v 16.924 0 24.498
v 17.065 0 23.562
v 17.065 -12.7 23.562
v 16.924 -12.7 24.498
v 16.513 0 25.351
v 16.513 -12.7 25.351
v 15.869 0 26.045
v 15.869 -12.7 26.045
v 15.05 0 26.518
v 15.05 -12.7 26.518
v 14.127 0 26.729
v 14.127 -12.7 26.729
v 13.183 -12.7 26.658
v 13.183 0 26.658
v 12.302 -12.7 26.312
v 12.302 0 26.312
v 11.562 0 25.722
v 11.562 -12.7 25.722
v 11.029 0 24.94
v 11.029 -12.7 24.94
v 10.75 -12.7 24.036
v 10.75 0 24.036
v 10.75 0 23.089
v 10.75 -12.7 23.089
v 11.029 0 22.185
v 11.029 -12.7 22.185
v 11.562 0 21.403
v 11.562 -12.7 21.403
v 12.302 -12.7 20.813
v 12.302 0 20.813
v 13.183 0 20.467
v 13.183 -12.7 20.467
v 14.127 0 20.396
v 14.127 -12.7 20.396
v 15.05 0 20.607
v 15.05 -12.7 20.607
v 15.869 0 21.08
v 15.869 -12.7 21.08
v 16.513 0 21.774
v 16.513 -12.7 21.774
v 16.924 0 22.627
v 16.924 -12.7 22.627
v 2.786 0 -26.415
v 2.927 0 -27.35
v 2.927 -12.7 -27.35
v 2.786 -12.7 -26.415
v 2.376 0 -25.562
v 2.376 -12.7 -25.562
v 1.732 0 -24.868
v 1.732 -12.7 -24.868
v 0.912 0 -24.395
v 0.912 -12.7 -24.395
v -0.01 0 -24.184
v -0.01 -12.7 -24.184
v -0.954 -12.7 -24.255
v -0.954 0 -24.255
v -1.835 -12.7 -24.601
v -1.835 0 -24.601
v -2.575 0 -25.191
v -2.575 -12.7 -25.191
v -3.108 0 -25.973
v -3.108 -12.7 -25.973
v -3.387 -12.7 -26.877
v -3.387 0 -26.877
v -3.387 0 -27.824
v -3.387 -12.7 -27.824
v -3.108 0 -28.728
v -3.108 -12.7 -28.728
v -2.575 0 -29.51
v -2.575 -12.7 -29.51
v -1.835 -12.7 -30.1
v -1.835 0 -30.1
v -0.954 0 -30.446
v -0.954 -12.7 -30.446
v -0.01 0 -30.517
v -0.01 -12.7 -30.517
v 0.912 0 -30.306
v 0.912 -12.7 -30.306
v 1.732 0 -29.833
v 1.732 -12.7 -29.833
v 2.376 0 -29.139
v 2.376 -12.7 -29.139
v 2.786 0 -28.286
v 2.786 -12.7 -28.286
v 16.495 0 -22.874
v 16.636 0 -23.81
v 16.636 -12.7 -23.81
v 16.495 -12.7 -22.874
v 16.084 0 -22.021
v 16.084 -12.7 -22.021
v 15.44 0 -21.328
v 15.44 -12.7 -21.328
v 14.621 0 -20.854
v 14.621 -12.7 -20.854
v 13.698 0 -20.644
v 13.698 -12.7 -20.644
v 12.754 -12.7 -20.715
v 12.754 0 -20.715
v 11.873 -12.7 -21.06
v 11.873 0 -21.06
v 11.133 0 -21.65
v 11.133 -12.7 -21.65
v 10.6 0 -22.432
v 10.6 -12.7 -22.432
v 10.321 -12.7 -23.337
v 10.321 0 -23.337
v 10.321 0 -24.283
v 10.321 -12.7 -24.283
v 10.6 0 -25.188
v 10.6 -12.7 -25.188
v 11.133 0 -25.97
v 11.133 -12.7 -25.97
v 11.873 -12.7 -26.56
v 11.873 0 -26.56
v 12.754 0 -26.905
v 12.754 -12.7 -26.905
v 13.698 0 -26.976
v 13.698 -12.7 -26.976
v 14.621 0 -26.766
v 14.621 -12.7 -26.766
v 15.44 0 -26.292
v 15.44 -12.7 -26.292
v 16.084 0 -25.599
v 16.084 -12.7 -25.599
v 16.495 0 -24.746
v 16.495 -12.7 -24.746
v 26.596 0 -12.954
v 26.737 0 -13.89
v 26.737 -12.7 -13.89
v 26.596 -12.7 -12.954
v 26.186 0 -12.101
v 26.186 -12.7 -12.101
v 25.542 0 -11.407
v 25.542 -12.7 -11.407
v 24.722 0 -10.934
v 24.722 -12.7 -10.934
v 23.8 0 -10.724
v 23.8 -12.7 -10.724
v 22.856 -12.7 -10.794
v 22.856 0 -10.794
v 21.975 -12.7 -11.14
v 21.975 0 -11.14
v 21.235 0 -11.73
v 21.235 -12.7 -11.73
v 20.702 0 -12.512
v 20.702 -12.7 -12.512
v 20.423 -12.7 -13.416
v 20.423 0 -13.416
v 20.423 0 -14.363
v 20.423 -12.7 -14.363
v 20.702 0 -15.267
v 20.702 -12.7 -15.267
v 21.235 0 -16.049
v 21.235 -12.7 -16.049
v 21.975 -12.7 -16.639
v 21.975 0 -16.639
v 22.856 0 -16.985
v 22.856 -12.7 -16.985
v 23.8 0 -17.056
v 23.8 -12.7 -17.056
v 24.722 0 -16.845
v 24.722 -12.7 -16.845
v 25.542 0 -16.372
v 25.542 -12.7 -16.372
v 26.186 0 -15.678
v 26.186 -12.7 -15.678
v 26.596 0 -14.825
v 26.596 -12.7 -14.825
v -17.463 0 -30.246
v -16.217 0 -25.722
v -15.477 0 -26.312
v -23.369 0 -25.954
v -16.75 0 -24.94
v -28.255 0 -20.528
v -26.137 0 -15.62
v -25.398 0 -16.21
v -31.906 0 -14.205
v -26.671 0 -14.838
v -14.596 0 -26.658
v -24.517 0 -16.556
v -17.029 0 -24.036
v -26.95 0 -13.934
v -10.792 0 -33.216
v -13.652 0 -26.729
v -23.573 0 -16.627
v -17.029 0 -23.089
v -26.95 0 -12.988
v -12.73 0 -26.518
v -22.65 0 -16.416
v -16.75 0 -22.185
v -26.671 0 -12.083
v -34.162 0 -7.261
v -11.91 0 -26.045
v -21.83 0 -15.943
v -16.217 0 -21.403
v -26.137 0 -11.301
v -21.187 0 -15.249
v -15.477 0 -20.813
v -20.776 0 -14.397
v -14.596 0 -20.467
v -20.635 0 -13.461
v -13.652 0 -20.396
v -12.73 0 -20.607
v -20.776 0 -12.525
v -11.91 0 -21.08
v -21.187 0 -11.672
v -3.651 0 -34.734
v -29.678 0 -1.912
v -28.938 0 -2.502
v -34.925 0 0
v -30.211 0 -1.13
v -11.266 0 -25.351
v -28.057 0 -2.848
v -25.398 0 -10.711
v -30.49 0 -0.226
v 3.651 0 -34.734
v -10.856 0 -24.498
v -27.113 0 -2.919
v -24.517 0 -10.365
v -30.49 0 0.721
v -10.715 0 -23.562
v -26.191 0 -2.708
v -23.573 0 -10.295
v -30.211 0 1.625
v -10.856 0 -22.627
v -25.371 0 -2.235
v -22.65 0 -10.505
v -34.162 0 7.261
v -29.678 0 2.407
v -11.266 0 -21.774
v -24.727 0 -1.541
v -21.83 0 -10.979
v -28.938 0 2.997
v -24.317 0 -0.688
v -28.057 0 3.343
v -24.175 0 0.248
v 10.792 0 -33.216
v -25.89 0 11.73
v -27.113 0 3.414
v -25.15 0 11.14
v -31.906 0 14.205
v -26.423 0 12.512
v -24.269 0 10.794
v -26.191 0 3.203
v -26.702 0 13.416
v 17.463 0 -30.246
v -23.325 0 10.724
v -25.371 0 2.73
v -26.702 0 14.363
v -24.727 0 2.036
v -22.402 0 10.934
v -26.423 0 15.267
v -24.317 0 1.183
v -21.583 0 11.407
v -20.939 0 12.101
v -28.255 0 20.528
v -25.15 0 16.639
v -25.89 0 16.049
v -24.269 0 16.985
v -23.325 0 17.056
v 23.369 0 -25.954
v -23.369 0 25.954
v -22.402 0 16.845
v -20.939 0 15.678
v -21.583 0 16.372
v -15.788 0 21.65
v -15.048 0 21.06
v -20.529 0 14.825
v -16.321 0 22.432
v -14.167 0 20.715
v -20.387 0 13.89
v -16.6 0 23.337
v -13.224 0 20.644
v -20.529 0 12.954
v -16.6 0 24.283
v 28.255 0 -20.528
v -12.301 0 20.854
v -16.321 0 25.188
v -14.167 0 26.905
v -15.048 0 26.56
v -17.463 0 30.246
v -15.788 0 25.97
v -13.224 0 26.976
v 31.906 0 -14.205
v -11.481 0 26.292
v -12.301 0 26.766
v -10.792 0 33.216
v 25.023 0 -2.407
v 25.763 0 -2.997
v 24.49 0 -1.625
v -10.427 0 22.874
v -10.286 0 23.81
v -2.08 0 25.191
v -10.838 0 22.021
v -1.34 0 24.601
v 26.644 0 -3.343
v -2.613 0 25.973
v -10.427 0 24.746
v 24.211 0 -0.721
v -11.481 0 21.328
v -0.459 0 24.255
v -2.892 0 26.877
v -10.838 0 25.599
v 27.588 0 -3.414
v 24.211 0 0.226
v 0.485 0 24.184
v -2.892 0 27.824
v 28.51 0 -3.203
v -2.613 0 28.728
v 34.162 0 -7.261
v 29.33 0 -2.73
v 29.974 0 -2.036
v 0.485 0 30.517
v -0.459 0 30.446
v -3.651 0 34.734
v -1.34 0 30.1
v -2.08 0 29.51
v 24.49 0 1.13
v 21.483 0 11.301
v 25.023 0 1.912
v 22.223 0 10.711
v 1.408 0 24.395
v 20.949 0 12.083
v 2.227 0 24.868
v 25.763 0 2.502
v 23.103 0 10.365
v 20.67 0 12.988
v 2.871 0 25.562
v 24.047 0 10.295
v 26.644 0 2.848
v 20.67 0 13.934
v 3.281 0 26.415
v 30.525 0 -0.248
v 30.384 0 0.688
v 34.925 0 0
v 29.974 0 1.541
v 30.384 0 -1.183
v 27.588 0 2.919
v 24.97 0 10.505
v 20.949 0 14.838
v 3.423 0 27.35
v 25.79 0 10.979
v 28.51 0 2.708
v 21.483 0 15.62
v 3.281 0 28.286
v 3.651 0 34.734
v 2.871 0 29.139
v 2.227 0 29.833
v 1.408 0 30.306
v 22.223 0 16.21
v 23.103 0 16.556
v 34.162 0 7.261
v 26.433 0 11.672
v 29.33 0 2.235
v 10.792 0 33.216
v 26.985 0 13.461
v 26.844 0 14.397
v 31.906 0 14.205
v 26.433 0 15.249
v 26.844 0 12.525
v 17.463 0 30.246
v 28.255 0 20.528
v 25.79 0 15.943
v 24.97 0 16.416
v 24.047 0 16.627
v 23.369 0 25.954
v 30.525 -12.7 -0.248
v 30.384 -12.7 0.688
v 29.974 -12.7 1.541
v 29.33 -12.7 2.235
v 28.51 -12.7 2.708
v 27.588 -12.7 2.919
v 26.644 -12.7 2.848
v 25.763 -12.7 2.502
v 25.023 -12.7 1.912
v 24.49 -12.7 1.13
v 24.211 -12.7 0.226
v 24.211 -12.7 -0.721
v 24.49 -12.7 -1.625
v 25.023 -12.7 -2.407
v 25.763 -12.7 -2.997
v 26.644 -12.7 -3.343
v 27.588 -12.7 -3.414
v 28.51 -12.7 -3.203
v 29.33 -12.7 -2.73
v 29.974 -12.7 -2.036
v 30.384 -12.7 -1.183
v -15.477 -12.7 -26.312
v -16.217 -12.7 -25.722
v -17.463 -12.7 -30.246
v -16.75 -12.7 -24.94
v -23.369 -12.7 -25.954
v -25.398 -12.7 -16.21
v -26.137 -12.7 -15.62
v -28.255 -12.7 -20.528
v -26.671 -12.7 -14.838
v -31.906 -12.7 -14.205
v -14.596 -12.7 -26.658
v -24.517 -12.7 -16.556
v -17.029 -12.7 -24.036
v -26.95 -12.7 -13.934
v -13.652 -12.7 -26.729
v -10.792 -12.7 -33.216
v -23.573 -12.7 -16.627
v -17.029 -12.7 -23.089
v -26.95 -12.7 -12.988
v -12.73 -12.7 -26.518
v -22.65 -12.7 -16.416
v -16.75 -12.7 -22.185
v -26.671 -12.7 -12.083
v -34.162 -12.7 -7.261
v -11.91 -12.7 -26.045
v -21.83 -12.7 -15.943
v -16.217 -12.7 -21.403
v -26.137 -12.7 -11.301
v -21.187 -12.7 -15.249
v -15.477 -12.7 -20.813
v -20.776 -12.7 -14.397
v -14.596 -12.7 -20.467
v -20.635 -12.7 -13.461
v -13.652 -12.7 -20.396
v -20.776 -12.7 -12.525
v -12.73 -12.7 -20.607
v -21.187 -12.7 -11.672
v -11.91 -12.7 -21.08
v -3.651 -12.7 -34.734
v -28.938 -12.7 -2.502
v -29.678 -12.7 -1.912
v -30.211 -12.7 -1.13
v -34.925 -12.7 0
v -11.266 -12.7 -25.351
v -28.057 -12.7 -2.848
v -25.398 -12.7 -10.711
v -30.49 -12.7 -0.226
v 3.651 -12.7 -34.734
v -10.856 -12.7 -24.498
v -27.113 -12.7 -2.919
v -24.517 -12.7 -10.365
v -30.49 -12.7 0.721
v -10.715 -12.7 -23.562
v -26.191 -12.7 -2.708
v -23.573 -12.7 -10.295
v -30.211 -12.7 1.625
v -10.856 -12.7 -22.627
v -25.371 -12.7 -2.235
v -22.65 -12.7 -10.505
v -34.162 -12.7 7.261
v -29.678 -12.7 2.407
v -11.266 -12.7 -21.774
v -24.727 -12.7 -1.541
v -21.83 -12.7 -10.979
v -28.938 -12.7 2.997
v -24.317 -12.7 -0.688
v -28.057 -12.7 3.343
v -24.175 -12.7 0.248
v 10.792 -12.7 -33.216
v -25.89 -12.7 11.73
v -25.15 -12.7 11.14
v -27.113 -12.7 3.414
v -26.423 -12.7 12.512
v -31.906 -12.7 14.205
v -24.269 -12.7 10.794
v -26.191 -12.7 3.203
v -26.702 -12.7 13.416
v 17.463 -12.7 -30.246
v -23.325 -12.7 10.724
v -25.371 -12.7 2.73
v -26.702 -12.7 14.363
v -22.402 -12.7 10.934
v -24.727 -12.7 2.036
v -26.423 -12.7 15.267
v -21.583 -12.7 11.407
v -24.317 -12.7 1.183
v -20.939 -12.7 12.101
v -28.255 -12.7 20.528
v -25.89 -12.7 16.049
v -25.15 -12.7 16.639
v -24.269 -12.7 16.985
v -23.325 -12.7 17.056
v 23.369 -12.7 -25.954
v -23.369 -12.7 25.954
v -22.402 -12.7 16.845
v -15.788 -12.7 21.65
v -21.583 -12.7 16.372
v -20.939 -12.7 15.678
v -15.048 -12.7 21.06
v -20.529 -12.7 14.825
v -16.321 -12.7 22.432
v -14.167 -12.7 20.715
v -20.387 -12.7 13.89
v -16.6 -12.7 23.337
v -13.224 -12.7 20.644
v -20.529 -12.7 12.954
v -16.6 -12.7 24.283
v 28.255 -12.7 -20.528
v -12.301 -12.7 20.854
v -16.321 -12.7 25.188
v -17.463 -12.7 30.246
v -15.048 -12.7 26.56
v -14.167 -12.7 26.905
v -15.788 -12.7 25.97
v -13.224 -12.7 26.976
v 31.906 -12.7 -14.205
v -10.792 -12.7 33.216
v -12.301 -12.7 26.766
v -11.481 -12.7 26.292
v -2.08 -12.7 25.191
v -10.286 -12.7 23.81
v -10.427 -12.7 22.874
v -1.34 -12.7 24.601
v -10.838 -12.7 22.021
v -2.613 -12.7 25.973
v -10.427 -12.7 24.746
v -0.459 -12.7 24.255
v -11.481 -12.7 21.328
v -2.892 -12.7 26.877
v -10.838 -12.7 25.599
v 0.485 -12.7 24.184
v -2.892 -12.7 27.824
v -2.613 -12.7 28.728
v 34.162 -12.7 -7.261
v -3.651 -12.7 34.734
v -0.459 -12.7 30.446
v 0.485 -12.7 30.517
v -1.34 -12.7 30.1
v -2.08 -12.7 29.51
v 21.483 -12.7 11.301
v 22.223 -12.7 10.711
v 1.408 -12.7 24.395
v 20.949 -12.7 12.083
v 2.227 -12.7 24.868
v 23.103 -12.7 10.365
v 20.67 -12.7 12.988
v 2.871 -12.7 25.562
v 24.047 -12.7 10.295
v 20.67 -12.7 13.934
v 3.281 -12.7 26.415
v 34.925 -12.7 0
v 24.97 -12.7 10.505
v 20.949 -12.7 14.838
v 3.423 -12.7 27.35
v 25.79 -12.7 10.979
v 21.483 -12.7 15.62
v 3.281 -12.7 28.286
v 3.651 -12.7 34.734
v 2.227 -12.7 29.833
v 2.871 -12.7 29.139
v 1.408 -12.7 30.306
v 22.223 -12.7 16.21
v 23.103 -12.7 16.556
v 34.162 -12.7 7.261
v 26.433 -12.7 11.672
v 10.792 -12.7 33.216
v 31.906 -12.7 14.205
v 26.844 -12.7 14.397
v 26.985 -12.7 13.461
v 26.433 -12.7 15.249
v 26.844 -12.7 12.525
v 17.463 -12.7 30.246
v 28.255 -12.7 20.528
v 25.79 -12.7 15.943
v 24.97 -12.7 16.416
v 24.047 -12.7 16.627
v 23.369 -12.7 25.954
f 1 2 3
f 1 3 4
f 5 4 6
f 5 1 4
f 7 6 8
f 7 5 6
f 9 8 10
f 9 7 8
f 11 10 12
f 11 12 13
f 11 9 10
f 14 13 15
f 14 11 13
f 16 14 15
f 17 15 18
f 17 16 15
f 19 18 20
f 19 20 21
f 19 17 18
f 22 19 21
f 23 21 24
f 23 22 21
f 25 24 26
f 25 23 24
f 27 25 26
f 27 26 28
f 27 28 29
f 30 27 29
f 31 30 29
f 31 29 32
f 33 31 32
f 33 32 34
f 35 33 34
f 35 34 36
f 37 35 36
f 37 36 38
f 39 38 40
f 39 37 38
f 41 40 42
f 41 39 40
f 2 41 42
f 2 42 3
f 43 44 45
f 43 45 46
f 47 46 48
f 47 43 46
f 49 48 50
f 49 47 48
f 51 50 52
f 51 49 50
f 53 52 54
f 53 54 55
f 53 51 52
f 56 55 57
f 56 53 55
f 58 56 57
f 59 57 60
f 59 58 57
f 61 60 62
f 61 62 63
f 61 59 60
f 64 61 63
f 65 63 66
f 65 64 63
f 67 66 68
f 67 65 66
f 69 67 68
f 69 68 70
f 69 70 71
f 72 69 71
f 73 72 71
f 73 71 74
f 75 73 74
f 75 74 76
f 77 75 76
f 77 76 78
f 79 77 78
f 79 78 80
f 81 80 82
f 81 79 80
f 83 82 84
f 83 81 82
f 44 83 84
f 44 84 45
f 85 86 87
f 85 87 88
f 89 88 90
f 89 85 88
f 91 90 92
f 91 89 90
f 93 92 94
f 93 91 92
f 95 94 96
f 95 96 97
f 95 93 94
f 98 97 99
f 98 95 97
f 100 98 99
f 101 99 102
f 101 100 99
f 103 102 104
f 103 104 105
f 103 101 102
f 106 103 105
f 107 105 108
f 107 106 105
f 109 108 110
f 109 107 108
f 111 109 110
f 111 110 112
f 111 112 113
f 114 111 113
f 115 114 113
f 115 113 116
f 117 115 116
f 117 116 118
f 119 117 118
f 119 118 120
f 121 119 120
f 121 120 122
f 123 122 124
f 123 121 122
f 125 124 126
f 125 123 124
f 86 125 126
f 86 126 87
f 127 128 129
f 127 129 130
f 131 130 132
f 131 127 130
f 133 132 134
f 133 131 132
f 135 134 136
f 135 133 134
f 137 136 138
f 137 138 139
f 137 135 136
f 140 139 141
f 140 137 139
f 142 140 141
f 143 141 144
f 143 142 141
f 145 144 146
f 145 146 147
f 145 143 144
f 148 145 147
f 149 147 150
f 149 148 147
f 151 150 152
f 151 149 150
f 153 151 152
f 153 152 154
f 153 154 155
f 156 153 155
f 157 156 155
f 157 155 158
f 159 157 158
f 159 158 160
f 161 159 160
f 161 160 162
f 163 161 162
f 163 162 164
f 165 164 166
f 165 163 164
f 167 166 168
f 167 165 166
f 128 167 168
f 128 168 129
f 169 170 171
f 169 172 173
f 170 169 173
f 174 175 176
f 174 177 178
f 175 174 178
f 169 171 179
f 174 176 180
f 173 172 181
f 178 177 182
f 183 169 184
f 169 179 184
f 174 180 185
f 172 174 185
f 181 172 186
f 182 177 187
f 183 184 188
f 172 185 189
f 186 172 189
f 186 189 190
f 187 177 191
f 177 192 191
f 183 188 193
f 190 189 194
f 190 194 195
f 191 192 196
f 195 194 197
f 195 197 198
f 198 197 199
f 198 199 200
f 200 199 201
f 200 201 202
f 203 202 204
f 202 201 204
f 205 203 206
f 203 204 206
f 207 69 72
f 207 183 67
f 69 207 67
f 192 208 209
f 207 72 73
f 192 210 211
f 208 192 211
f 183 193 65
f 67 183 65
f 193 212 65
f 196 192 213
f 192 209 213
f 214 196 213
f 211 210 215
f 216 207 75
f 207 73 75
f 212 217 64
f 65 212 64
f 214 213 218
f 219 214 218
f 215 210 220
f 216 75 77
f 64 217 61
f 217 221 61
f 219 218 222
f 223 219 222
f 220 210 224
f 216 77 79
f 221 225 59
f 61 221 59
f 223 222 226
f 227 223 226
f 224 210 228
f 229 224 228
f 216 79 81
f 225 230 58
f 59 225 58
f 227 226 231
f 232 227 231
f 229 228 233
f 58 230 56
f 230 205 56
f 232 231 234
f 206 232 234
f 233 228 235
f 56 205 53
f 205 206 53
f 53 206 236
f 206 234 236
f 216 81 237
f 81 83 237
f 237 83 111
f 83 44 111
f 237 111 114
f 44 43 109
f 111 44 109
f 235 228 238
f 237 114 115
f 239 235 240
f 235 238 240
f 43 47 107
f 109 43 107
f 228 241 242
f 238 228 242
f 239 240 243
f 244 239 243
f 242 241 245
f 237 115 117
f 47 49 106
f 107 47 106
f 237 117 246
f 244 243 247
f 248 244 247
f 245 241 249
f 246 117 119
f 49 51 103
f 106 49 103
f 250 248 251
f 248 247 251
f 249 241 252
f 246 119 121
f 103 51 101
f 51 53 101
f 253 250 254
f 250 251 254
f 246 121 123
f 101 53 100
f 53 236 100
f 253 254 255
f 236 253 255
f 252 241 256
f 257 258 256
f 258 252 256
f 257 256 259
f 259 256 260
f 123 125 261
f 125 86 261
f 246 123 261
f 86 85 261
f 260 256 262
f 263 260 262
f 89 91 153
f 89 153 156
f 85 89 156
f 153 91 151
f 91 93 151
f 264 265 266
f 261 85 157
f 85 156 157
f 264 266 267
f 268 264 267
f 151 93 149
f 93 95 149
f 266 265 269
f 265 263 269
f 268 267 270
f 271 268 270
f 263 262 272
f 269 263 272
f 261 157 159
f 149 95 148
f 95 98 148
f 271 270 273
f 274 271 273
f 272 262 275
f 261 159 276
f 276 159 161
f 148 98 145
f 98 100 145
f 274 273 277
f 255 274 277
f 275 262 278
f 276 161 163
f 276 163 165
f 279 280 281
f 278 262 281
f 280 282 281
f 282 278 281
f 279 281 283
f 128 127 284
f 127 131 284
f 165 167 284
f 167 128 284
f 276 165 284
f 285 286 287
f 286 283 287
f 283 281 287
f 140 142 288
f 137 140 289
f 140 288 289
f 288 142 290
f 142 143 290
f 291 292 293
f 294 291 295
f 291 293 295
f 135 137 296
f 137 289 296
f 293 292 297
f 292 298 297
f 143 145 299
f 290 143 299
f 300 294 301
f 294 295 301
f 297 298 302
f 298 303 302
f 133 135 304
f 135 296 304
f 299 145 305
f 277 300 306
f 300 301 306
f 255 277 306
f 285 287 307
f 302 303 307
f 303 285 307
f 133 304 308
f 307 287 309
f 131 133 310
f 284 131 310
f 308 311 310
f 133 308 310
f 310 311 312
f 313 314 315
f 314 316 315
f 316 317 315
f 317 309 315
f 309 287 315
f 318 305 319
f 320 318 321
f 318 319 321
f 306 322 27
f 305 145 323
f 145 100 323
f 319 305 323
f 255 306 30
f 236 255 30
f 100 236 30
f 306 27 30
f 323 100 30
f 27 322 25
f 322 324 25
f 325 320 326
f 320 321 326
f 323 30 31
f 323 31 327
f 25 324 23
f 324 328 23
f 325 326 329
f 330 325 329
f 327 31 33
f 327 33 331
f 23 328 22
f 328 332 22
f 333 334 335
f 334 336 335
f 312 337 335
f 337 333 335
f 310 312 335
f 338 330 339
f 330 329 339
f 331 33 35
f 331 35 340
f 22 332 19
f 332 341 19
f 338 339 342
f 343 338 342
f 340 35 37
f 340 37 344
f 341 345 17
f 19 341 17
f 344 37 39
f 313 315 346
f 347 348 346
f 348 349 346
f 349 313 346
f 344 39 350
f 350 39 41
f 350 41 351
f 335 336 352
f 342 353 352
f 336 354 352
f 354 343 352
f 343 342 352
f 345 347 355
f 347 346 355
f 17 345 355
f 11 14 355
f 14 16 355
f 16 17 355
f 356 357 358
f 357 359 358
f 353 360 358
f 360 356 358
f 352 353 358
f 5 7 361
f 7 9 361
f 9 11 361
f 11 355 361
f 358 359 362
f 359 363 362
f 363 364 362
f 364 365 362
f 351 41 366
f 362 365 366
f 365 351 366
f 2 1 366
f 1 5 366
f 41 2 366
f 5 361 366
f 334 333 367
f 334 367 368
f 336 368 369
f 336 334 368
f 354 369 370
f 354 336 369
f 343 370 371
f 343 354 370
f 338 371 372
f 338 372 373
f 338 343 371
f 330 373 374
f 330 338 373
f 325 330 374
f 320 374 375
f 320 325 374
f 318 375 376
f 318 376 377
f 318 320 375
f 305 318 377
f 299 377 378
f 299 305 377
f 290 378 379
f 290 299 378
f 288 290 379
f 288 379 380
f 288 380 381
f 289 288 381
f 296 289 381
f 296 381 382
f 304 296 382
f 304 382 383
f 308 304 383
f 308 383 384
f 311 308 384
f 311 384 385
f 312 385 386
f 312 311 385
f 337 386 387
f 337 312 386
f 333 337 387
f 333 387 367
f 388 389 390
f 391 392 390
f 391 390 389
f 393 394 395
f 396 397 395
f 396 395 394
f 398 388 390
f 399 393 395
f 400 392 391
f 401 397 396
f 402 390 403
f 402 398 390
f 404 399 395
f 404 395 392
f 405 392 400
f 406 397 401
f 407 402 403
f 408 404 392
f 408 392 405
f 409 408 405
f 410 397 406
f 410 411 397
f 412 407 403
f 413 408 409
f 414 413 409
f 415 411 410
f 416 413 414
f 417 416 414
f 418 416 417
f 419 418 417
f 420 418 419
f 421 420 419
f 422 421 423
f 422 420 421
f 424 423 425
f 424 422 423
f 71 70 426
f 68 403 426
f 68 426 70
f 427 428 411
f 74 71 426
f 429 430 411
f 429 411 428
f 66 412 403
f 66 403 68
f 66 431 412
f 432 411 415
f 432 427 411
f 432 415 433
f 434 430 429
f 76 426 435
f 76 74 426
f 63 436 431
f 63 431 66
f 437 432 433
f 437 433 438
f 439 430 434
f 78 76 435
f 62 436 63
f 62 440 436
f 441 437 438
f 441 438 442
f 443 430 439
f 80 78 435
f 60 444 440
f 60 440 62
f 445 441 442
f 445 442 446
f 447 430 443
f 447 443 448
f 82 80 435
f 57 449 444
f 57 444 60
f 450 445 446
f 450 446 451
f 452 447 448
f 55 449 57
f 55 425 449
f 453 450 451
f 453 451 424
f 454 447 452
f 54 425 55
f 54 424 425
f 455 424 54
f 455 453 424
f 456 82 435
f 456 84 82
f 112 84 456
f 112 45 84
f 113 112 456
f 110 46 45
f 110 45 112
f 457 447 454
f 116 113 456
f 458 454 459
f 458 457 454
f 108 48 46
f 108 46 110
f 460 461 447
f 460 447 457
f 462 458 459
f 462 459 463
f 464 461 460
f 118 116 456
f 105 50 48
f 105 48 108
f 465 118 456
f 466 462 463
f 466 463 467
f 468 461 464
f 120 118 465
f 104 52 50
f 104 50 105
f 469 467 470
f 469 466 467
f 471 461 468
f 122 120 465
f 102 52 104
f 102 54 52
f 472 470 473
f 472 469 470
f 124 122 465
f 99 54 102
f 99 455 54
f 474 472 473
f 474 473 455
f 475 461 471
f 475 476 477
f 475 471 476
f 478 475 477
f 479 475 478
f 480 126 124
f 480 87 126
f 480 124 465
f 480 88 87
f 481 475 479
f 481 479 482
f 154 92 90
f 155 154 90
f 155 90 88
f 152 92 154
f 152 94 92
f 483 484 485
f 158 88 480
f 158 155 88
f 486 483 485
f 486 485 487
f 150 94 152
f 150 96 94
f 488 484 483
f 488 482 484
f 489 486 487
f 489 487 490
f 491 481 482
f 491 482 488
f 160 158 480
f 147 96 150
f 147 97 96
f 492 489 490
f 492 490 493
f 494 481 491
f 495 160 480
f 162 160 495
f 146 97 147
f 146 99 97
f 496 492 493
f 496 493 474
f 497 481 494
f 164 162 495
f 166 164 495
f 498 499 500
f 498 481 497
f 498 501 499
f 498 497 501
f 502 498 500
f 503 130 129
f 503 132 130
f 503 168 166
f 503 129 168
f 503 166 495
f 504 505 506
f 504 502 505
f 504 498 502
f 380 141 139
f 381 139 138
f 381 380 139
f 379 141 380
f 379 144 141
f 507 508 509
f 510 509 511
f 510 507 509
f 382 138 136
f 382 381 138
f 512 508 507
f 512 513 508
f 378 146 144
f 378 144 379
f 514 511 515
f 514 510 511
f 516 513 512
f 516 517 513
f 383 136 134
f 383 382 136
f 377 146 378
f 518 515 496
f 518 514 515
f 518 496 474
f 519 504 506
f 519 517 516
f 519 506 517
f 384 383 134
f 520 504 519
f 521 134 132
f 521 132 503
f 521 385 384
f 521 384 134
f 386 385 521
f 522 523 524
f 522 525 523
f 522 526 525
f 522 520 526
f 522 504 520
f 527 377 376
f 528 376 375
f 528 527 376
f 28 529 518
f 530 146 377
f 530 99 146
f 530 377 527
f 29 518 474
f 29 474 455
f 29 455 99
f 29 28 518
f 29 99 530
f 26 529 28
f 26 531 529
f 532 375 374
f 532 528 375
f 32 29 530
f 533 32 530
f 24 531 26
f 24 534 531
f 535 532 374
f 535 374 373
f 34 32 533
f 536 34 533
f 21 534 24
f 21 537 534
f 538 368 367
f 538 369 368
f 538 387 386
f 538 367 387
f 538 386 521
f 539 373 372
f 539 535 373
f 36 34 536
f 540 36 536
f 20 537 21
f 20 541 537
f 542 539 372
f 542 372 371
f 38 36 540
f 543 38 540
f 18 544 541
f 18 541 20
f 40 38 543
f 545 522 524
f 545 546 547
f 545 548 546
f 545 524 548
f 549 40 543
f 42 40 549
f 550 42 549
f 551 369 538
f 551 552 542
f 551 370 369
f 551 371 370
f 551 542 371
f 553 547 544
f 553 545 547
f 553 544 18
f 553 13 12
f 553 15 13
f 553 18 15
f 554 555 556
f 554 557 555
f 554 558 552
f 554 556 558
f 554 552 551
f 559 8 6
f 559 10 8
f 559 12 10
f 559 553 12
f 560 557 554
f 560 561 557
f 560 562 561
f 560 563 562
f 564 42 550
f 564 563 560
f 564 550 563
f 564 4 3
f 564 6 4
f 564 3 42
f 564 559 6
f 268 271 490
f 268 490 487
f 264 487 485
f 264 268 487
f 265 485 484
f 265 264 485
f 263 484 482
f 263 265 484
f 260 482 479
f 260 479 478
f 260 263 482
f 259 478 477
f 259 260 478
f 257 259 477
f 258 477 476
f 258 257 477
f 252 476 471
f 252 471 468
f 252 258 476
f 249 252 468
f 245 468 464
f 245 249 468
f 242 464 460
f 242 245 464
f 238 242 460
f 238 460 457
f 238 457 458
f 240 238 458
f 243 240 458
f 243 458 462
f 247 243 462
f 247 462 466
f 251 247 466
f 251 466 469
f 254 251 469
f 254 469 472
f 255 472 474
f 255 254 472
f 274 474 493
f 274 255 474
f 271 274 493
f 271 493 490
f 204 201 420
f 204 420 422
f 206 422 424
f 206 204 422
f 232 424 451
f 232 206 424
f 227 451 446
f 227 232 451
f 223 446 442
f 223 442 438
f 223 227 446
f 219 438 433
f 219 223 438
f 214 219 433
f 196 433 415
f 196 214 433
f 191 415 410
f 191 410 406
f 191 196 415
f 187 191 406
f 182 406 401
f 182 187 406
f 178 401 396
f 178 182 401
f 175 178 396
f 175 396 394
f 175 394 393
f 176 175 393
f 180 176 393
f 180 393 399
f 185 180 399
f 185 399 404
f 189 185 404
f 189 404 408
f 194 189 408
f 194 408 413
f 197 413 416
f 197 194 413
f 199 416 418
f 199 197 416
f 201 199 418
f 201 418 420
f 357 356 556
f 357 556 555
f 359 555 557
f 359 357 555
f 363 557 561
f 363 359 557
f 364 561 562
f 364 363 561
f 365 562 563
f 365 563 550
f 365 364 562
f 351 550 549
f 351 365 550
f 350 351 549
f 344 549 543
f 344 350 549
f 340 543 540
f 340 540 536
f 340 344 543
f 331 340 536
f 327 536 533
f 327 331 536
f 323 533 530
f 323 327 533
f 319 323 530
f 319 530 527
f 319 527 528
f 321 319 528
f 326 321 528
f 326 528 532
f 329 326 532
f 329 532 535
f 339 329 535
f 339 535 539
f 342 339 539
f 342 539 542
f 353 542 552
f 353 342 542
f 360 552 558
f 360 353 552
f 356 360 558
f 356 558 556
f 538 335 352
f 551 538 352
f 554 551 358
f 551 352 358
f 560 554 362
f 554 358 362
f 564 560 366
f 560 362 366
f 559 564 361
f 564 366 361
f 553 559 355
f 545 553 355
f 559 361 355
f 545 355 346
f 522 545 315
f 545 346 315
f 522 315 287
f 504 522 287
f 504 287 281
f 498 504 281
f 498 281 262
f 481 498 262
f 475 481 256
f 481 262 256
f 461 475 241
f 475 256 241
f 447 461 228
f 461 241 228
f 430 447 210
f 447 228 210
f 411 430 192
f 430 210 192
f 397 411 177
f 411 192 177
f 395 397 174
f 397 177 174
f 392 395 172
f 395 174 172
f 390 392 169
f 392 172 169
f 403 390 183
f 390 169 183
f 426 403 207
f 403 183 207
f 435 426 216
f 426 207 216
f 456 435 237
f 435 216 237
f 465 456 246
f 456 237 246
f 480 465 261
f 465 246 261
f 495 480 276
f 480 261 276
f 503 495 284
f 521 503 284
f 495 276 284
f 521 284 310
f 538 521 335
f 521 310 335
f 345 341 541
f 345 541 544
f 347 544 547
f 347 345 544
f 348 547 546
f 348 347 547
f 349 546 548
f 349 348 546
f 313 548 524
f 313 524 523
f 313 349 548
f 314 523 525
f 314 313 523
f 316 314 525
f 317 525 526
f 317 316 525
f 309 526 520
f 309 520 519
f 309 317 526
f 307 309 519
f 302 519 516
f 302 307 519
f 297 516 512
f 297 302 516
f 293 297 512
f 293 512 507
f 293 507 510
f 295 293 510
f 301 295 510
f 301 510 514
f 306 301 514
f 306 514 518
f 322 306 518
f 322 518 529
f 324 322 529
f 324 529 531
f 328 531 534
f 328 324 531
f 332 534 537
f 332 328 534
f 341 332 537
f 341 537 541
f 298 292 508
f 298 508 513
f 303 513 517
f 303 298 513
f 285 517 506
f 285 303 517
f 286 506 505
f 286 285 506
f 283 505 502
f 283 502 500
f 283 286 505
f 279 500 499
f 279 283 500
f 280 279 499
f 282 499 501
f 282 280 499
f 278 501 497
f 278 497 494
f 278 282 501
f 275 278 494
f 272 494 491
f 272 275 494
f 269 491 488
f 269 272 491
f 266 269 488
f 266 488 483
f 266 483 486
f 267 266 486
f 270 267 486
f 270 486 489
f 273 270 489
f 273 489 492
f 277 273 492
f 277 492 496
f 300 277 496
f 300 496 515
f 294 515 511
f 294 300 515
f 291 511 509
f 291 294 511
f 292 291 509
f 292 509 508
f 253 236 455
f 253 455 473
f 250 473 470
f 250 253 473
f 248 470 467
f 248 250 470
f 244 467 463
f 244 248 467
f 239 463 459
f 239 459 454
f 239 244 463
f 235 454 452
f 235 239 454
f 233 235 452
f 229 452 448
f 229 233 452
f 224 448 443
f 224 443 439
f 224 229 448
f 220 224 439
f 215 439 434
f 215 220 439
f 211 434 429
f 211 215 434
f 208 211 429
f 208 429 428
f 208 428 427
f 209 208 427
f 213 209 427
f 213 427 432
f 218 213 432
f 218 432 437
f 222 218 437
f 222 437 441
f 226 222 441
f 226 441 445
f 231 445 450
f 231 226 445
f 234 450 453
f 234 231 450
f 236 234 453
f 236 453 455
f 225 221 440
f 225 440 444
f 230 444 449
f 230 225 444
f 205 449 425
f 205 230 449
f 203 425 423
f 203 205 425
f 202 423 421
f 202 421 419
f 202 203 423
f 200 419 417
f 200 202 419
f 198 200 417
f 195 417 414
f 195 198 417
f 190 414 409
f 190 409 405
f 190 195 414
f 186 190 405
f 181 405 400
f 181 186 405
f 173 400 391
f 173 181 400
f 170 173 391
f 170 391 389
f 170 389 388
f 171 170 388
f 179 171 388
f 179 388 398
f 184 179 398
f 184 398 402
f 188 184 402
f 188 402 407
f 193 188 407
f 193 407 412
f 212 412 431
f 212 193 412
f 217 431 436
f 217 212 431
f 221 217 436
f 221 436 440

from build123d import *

# Parameters (mm, degrees)
F0_R     = 34.925
F0_R_2   = 3.175
F1_DEPTH = 12.7


with BuildPart() as f1:
    # F0 (on Front) → F1 (new body)
    with BuildSketch(Plane.XZ):
        Circle(F0_R)
        with Locations((-0.247554, -27.350496)):
            Circle(F0_R_2, mode=Mode.SUBTRACT)
        with Locations((-13.889636, -23.562447)):
            Circle(F0_R_2, mode=Mode.SUBTRACT)
        with Locations((-23.810001, -13.46086)):
            Circle(F0_R_2, mode=Mode.SUBTRACT)
        with Locations((13.46086, -23.810001)):
            Circle(F0_R_2, mode=Mode.SUBTRACT)
        with Locations((23.562447, -13.889636)):
            Circle(F0_R_2, mode=Mode.SUBTRACT)
        with Locations((27.350496, -0.247554)):
            Circle(F0_R_2, mode=Mode.SUBTRACT)
        with Locations((-27.350496, 0.247554)):
            Circle(F0_R_2, mode=Mode.SUBTRACT)
        with Locations((-23.562447, 13.889636)):
            Circle(F0_R_2, mode=Mode.SUBTRACT)
        with Locations((-13.46086, 23.810001)):
            Circle(F0_R_2, mode=Mode.SUBTRACT)
        with Locations((23.810001, 13.46086)):
            Circle(F0_R_2, mode=Mode.SUBTRACT)
        with Locations((13.889636, 23.562447)):
            Circle(F0_R_2, mode=Mode.SUBTRACT)
        with Locations((0.247554, 27.350496)):
            Circle(F0_R_2, mode=Mode.SUBTRACT)
    extrude(amount=F1_DEPTH)


solid = f1.part
